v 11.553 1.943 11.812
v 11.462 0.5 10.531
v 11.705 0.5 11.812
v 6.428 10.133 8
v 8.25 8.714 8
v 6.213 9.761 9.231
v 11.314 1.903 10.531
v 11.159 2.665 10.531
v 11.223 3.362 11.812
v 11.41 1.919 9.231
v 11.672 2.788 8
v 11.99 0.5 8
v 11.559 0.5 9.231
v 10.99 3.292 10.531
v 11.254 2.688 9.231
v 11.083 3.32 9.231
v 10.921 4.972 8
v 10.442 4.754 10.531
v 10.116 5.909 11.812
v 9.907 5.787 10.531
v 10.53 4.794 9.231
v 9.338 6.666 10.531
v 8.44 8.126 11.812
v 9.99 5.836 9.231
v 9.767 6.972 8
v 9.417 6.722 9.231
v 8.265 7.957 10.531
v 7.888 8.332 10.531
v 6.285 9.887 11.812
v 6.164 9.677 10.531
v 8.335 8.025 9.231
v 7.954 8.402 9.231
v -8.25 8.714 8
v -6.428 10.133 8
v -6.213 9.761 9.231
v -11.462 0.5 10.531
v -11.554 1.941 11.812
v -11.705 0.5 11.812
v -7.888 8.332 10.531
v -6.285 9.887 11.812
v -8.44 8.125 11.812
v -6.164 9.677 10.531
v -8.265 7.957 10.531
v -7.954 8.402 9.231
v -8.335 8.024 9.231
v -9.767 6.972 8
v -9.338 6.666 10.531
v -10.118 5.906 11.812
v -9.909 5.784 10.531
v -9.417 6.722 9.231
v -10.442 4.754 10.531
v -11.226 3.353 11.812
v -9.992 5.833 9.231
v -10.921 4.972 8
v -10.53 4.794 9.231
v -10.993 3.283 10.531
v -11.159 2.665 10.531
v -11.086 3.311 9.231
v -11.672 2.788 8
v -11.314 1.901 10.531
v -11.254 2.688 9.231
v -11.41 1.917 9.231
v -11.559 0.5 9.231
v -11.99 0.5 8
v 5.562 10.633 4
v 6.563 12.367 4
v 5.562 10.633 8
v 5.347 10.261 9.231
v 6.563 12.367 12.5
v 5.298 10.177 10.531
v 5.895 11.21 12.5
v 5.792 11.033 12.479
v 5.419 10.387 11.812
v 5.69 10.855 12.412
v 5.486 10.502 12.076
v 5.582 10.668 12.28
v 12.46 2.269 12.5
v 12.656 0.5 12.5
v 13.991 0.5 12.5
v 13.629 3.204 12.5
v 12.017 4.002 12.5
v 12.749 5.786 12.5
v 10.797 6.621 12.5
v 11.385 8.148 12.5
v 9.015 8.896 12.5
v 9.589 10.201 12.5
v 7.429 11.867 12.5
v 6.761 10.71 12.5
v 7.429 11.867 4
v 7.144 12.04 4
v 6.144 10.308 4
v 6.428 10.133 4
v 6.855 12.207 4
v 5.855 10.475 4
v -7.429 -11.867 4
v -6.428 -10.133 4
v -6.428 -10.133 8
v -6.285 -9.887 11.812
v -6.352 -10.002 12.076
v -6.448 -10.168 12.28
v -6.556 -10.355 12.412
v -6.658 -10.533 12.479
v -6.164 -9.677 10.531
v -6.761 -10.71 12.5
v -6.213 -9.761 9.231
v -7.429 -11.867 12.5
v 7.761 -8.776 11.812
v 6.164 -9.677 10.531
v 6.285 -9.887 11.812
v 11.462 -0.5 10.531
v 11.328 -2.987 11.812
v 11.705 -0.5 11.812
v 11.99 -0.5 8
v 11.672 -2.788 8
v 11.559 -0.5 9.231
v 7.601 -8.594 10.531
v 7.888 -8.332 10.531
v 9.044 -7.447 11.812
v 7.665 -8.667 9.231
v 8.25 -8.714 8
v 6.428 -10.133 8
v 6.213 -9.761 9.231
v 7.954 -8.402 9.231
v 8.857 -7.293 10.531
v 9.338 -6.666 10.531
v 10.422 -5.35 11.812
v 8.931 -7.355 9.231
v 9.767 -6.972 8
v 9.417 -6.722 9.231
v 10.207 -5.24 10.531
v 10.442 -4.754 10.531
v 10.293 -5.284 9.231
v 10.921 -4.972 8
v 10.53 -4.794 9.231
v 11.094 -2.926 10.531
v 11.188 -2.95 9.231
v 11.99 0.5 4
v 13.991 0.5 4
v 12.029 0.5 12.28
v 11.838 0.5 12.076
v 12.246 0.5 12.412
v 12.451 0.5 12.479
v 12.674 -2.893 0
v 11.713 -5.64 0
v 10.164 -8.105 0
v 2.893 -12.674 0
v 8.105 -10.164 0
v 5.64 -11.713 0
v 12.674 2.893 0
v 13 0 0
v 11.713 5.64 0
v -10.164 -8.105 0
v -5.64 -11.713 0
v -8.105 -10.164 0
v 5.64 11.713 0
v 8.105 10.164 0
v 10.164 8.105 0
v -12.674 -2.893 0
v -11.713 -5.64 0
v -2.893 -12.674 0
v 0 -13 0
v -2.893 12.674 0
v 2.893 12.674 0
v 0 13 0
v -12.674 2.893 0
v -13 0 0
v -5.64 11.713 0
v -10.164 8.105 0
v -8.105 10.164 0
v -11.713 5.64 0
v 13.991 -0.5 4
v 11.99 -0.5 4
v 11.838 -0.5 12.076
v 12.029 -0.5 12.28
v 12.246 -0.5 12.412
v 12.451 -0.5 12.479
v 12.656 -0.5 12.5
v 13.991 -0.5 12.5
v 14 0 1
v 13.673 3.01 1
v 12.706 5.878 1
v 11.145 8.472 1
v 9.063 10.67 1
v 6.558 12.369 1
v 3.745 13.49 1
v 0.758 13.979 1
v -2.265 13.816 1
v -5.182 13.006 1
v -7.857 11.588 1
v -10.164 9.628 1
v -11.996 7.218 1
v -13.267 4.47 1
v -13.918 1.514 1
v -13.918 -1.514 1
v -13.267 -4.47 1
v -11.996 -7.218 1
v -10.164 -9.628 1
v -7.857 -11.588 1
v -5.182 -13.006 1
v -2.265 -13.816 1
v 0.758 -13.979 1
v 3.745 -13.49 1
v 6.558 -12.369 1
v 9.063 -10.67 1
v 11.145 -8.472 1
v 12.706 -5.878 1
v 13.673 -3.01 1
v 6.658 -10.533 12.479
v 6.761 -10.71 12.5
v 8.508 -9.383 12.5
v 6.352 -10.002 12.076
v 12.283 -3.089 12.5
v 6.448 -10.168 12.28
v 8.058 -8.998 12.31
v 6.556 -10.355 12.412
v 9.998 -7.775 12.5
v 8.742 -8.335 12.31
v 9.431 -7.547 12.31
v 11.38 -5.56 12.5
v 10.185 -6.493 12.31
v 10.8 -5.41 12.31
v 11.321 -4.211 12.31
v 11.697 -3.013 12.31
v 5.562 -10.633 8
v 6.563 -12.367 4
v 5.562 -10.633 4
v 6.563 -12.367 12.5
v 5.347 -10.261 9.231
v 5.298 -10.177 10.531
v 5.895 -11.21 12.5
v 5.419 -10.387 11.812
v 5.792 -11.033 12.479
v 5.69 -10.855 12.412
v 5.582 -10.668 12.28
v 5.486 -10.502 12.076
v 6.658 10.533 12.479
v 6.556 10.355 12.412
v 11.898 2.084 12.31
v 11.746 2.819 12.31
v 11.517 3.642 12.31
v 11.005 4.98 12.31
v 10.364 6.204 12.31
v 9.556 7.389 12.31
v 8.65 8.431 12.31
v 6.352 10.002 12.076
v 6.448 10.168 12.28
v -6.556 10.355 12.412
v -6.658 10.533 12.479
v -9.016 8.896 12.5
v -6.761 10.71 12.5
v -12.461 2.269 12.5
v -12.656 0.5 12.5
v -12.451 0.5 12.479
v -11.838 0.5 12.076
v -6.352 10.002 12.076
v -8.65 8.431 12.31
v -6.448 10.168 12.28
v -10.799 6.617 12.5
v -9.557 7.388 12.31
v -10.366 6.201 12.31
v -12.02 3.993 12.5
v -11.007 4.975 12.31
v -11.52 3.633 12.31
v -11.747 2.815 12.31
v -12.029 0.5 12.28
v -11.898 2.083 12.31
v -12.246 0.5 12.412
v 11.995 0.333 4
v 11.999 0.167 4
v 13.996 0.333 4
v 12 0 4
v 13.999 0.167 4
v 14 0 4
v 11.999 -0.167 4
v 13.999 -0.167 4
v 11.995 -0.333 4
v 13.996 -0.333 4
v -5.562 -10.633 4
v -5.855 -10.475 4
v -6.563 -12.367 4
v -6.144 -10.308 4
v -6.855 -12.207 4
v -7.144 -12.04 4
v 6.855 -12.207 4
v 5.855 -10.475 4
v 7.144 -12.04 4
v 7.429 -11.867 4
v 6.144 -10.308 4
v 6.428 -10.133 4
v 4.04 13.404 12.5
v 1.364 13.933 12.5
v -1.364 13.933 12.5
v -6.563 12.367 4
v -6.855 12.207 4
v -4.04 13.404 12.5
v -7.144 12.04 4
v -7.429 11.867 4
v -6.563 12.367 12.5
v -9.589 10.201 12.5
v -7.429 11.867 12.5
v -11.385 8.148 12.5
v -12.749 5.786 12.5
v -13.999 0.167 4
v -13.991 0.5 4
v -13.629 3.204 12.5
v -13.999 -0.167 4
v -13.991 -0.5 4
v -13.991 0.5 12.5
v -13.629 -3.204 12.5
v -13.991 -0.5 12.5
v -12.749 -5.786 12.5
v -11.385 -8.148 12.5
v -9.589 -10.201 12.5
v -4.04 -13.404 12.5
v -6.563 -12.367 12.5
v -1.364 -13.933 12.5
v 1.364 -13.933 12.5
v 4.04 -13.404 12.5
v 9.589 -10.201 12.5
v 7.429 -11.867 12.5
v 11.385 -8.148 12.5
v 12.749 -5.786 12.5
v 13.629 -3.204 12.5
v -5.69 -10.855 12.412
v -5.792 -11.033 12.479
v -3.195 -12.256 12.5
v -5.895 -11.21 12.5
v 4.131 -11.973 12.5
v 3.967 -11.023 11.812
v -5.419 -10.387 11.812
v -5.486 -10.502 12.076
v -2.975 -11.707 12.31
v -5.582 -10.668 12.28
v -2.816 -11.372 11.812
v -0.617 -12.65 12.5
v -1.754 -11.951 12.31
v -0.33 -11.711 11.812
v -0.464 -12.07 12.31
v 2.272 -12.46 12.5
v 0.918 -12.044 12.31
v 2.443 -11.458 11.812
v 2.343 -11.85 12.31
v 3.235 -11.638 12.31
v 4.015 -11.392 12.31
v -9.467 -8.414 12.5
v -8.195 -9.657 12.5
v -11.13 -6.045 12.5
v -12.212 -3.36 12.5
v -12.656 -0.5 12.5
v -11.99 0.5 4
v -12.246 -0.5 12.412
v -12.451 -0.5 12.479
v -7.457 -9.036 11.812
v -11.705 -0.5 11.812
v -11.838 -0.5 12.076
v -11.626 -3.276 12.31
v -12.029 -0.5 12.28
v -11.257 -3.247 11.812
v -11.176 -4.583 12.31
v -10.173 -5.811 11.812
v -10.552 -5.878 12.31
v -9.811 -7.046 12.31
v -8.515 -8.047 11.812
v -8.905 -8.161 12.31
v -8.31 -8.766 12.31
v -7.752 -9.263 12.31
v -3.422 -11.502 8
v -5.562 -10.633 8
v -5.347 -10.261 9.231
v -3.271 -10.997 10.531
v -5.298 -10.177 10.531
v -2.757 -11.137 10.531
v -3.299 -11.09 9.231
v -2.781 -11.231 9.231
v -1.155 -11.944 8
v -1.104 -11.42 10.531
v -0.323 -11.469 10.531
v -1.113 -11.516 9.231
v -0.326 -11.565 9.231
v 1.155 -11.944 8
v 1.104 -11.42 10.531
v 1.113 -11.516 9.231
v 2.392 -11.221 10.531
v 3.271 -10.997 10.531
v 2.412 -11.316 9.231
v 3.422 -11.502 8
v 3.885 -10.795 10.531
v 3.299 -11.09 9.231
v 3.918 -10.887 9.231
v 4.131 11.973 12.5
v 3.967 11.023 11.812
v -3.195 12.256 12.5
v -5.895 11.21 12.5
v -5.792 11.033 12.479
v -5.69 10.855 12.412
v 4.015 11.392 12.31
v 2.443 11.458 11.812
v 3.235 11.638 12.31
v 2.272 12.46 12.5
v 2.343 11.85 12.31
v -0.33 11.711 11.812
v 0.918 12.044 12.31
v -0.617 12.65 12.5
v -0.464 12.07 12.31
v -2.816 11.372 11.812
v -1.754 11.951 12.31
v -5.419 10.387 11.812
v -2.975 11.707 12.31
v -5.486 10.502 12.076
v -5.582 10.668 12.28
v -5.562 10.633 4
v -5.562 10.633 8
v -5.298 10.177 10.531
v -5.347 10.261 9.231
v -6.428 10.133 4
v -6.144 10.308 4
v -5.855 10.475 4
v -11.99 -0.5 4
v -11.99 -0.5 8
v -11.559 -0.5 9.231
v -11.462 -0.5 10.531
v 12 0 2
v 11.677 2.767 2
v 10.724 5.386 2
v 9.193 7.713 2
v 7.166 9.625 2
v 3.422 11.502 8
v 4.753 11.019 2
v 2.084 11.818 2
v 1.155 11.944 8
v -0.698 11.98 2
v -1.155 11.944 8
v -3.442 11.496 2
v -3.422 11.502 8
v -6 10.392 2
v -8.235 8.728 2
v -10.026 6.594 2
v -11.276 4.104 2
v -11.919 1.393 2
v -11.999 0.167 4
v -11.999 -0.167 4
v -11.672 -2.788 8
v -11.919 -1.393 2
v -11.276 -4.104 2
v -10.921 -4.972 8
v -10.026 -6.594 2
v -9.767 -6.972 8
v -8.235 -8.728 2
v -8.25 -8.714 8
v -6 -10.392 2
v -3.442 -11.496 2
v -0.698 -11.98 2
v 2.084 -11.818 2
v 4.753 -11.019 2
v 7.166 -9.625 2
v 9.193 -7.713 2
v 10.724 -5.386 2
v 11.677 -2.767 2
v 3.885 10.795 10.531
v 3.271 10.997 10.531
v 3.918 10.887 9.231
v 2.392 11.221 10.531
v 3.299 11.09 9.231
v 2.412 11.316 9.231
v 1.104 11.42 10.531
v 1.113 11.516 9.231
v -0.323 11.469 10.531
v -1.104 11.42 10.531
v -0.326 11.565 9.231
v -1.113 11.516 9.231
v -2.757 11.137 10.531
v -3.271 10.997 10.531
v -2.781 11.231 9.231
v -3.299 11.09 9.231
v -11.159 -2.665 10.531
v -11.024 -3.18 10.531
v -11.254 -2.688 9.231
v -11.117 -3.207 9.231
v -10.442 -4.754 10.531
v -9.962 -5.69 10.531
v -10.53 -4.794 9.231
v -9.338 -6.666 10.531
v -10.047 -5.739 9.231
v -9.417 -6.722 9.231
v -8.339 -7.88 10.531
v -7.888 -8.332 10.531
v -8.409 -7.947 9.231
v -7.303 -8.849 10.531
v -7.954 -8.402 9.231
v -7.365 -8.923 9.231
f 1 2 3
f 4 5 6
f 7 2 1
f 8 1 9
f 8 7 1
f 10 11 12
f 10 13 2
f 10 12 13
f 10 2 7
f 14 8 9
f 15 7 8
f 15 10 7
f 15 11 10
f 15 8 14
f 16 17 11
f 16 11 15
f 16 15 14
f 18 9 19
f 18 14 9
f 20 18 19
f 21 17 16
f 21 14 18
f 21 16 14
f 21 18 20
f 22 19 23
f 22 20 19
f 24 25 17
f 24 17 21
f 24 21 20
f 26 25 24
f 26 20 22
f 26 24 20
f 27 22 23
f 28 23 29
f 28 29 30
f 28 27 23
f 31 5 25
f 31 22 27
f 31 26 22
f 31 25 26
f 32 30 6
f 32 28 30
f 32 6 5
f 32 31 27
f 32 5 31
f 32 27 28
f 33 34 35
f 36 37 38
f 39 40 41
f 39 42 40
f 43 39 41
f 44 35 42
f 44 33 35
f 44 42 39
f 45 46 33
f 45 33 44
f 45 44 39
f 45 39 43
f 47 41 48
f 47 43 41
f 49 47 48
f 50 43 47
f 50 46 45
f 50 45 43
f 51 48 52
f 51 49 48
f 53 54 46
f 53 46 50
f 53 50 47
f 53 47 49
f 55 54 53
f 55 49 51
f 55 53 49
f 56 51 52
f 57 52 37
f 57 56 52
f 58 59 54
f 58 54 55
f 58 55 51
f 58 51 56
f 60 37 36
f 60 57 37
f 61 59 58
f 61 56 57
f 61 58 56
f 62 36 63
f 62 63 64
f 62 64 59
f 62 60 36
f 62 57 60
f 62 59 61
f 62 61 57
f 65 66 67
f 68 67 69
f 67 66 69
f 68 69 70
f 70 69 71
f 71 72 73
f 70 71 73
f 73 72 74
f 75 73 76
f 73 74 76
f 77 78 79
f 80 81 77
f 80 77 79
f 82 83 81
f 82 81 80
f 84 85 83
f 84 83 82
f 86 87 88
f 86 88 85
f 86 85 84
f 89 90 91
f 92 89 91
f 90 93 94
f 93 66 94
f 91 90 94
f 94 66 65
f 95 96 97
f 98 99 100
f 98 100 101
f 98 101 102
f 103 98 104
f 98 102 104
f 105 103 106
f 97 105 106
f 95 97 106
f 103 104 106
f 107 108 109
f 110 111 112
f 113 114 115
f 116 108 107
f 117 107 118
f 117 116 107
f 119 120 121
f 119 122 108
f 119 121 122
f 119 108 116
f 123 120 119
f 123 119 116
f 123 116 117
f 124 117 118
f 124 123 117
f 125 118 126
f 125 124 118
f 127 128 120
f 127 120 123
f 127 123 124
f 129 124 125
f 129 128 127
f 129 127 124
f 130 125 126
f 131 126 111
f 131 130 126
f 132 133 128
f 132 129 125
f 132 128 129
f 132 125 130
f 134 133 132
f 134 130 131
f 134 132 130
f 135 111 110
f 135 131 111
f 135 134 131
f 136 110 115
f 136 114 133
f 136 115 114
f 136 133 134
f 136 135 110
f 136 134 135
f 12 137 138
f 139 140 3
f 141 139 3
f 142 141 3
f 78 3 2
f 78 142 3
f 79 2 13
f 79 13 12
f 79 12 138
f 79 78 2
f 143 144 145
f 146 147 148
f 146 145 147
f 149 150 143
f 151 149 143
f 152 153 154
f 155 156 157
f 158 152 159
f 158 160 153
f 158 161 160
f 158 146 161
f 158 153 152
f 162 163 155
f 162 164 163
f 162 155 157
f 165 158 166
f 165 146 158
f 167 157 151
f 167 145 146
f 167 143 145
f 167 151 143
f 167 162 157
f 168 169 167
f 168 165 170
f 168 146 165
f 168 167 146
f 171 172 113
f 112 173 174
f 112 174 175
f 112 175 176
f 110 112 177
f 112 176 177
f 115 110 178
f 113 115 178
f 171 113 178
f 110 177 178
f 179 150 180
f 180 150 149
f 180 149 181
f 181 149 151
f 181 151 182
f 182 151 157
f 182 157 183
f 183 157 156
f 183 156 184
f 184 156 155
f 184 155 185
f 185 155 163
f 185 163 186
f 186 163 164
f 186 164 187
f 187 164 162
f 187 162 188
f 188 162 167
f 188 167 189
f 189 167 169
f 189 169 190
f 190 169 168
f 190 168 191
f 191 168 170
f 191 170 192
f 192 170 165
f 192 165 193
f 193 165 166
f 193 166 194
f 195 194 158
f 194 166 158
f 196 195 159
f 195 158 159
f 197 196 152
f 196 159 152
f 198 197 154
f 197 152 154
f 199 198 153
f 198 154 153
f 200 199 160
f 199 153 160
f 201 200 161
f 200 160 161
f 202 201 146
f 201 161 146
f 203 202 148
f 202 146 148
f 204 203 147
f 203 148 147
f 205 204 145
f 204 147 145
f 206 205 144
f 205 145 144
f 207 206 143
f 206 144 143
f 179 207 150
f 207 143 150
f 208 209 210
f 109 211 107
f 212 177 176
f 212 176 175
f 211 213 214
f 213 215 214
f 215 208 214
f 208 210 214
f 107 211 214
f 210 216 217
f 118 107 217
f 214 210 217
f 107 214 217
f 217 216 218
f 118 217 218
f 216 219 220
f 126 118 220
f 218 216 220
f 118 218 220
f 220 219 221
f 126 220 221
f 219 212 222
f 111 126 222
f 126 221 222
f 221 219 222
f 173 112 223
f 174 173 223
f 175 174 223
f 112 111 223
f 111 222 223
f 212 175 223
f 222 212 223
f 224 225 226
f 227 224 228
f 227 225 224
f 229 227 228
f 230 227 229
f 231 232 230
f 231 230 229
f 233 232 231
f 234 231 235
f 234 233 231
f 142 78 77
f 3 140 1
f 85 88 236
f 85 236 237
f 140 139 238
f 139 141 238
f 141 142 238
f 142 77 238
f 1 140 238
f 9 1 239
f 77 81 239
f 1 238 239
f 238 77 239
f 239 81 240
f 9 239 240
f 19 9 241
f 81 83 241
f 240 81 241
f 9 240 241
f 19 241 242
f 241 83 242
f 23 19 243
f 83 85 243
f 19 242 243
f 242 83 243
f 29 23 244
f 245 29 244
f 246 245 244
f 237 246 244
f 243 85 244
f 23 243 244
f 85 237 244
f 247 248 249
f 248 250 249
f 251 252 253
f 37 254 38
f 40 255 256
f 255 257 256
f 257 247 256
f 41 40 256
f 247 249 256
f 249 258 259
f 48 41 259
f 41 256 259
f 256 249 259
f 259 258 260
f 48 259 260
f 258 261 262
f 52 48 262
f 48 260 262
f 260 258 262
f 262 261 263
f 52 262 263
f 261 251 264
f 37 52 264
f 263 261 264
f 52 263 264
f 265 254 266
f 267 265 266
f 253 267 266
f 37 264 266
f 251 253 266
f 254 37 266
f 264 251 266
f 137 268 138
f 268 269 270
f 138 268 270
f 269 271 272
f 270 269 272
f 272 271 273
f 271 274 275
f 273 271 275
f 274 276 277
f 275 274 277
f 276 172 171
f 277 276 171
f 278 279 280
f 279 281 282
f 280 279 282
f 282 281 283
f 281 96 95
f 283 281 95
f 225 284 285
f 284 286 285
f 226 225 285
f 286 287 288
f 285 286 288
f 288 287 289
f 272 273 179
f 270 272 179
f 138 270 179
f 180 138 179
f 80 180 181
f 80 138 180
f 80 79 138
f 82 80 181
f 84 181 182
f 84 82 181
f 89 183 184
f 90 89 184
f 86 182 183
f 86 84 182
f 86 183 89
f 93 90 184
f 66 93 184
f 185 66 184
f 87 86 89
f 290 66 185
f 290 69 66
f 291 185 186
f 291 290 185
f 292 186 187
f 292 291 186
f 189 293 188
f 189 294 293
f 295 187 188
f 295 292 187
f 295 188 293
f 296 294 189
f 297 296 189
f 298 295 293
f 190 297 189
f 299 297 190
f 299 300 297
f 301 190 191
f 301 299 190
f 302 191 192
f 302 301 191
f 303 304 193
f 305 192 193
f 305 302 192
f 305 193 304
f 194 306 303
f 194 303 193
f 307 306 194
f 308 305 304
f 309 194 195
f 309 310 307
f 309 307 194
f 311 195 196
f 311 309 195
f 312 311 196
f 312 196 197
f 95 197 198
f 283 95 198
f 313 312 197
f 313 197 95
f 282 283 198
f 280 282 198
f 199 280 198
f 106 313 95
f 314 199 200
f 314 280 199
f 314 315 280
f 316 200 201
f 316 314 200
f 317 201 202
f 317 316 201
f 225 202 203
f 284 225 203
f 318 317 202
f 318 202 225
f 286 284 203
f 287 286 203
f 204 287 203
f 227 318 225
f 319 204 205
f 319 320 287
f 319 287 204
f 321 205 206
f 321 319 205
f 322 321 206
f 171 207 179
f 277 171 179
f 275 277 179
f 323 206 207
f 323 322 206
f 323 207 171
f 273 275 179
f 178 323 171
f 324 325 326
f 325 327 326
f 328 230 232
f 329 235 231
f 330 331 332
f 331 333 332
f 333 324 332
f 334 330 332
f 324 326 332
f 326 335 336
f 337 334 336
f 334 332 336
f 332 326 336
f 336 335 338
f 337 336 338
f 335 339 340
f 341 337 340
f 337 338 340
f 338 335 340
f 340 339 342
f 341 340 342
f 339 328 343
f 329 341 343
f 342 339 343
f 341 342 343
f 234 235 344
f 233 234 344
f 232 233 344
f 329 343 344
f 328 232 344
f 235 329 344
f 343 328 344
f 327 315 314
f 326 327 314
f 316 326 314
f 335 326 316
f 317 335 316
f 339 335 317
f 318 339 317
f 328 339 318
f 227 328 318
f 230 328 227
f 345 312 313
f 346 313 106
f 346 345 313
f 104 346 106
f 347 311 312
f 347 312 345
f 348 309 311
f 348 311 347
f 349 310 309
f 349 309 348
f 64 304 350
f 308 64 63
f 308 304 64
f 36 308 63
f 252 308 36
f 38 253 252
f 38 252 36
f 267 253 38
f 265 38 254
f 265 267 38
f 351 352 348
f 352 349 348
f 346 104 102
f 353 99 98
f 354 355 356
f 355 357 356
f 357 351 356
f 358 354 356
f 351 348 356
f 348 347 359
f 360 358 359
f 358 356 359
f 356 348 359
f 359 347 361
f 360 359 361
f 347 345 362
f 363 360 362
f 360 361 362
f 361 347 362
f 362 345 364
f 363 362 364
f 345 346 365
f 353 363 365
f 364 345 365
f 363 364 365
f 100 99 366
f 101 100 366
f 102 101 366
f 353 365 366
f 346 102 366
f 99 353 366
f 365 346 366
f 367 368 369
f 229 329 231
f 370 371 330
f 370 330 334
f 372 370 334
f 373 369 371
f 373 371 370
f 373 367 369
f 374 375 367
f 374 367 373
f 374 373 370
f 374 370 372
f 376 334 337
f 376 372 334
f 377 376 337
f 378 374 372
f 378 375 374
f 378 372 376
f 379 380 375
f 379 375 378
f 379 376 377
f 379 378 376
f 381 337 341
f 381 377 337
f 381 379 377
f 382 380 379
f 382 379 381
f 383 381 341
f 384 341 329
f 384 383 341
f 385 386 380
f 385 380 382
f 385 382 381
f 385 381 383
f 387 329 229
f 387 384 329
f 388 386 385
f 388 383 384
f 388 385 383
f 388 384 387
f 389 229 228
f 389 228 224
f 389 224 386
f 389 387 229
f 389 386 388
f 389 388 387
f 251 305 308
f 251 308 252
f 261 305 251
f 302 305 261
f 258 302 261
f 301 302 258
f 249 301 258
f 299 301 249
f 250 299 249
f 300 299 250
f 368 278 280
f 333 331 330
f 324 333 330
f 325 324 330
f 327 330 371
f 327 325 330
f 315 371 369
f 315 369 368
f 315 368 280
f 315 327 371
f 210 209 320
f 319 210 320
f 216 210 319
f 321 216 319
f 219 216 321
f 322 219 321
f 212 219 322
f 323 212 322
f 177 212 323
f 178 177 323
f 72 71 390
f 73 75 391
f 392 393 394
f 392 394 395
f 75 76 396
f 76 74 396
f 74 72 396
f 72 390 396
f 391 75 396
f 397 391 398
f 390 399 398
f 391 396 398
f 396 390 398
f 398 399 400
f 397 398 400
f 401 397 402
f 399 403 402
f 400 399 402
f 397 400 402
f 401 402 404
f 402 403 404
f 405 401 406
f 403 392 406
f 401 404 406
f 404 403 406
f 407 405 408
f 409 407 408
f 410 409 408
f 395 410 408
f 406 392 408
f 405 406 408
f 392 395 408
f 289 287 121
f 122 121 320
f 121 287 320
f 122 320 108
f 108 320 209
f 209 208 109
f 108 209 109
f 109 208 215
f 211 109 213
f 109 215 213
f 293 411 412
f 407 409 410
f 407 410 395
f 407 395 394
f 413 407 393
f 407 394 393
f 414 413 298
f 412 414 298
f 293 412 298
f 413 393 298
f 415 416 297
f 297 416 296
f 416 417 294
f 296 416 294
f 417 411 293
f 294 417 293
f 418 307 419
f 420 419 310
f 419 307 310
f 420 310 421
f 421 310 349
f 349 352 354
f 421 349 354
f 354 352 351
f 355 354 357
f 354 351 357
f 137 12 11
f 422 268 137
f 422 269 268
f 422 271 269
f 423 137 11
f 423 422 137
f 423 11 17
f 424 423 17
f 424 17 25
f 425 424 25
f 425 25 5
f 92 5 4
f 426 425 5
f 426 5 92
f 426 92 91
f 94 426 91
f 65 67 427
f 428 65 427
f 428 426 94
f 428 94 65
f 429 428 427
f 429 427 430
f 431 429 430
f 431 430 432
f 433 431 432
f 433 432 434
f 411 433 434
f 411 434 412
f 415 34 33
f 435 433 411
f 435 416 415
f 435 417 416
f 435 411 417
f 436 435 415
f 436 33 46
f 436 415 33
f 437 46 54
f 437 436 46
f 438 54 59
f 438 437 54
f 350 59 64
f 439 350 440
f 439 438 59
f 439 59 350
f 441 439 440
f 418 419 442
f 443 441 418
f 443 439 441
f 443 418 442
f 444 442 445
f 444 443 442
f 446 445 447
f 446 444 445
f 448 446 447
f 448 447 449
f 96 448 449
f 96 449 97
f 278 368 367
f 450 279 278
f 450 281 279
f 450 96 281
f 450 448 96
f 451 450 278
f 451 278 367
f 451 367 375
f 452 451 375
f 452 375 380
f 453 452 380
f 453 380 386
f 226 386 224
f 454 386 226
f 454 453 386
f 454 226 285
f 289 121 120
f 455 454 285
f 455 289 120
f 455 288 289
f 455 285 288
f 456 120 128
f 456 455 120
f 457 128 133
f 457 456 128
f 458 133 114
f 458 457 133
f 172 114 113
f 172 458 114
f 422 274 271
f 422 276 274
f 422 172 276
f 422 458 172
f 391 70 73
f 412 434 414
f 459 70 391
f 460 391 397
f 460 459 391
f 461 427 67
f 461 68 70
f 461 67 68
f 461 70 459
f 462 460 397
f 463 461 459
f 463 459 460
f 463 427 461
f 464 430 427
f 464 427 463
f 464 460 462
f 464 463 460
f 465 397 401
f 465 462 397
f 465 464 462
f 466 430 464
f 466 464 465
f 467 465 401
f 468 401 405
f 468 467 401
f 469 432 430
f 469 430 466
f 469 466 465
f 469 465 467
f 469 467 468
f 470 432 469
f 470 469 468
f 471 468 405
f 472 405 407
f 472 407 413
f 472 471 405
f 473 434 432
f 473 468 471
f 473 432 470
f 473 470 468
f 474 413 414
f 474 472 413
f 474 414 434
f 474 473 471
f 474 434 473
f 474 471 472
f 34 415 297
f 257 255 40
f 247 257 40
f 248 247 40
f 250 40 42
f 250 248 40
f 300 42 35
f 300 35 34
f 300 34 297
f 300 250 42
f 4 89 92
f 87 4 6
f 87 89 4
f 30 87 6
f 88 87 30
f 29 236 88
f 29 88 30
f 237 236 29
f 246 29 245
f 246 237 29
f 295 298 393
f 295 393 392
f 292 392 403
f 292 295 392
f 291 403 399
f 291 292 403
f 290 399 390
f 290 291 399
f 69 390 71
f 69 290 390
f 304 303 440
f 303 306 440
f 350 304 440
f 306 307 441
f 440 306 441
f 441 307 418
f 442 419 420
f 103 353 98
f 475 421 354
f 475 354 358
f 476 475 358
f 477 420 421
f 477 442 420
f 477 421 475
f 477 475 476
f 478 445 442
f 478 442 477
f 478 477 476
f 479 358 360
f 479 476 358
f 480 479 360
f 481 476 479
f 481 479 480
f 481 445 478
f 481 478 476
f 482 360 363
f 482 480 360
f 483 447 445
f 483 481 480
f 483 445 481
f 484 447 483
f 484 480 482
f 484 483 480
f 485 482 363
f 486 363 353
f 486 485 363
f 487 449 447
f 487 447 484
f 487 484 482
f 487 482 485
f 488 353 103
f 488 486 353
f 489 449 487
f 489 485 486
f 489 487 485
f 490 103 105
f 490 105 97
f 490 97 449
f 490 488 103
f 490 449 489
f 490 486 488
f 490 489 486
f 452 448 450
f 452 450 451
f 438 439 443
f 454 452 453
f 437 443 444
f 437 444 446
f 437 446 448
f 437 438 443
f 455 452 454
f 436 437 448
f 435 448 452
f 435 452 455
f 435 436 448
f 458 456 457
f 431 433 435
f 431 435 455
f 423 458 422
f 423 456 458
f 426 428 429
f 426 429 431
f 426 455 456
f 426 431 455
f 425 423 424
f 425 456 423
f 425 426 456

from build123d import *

# Parameters (mm, degrees)
F3_R          = 1
F4_SIZE       = 1
F5_W          = 50
F5_H          = 14
F6_DEPTH      = 0.5
F6_DEPTH_BACK = 0.5
F7_COUNT      = 3


with BuildPart() as f2:
    # F1 (on Front) → F2 (revolve)
    with BuildSketch(Plane.XZ):
        Polygon((0, 2), (0, 0), (14, 0), (14, 12.5), (12, 12.5), (12, 8), (12, 2), align=None)
        with BuildLine():
            Line((12, 8), (12, 12.5))
            ThreePointArc((12, 12.5), (11.4651427749, 10.25), (12, 8))
        make_face()
    revolve(axis=Axis((0, 0, 9.526854381), (0, 0, 1)))

    # F3
    f3_edges = [f2.edges().sort_by_distance(p)[0] for p in [
        (-12, 0, 12.5),
    ]]
    fillet(f3_edges, radius=F3_R)

    # F4
    f4_edges = [f2.edges().sort_by_distance(p)[0] for p in [
        (-14, 0, 0),
    ]]
    chamfer(f4_edges, length=F4_SIZE)


with BuildPart() as f6:
    # F5 (on Front) → F6 (new body, two sides)
    with BuildSketch(Plane.XZ) as f6_sk:
        with Locations((0, 11)):
            Rectangle(F5_W, F5_H)
    extrude(amount=F6_DEPTH)
    extrude(f6_sk.sketch, amount=-F6_DEPTH_BACK)


with BuildPart() as f7_1:
    # F7: instance of F6
    add(f6.part.rotate(Axis((0, 0, 20.1674159616), (0, 0, 1)), 1 * 360 / F7_COUNT))


with BuildPart() as f7_2:
    # F7: instance of F6
    add(f6.part.rotate(Axis((0, 0, 20.1674159616), (0, 0, 1)), 2 * 360 / F7_COUNT))


with BuildPart() as f2_1:
    add(f2.part)

    # F8: cut F7_1, F6, F7_2
    add(f7_1.part, mode=Mode.SUBTRACT)
    add(f6.part, mode=Mode.SUBTRACT)
    add(f7_2.part, mode=Mode.SUBTRACT)


solid = f2_1.part
